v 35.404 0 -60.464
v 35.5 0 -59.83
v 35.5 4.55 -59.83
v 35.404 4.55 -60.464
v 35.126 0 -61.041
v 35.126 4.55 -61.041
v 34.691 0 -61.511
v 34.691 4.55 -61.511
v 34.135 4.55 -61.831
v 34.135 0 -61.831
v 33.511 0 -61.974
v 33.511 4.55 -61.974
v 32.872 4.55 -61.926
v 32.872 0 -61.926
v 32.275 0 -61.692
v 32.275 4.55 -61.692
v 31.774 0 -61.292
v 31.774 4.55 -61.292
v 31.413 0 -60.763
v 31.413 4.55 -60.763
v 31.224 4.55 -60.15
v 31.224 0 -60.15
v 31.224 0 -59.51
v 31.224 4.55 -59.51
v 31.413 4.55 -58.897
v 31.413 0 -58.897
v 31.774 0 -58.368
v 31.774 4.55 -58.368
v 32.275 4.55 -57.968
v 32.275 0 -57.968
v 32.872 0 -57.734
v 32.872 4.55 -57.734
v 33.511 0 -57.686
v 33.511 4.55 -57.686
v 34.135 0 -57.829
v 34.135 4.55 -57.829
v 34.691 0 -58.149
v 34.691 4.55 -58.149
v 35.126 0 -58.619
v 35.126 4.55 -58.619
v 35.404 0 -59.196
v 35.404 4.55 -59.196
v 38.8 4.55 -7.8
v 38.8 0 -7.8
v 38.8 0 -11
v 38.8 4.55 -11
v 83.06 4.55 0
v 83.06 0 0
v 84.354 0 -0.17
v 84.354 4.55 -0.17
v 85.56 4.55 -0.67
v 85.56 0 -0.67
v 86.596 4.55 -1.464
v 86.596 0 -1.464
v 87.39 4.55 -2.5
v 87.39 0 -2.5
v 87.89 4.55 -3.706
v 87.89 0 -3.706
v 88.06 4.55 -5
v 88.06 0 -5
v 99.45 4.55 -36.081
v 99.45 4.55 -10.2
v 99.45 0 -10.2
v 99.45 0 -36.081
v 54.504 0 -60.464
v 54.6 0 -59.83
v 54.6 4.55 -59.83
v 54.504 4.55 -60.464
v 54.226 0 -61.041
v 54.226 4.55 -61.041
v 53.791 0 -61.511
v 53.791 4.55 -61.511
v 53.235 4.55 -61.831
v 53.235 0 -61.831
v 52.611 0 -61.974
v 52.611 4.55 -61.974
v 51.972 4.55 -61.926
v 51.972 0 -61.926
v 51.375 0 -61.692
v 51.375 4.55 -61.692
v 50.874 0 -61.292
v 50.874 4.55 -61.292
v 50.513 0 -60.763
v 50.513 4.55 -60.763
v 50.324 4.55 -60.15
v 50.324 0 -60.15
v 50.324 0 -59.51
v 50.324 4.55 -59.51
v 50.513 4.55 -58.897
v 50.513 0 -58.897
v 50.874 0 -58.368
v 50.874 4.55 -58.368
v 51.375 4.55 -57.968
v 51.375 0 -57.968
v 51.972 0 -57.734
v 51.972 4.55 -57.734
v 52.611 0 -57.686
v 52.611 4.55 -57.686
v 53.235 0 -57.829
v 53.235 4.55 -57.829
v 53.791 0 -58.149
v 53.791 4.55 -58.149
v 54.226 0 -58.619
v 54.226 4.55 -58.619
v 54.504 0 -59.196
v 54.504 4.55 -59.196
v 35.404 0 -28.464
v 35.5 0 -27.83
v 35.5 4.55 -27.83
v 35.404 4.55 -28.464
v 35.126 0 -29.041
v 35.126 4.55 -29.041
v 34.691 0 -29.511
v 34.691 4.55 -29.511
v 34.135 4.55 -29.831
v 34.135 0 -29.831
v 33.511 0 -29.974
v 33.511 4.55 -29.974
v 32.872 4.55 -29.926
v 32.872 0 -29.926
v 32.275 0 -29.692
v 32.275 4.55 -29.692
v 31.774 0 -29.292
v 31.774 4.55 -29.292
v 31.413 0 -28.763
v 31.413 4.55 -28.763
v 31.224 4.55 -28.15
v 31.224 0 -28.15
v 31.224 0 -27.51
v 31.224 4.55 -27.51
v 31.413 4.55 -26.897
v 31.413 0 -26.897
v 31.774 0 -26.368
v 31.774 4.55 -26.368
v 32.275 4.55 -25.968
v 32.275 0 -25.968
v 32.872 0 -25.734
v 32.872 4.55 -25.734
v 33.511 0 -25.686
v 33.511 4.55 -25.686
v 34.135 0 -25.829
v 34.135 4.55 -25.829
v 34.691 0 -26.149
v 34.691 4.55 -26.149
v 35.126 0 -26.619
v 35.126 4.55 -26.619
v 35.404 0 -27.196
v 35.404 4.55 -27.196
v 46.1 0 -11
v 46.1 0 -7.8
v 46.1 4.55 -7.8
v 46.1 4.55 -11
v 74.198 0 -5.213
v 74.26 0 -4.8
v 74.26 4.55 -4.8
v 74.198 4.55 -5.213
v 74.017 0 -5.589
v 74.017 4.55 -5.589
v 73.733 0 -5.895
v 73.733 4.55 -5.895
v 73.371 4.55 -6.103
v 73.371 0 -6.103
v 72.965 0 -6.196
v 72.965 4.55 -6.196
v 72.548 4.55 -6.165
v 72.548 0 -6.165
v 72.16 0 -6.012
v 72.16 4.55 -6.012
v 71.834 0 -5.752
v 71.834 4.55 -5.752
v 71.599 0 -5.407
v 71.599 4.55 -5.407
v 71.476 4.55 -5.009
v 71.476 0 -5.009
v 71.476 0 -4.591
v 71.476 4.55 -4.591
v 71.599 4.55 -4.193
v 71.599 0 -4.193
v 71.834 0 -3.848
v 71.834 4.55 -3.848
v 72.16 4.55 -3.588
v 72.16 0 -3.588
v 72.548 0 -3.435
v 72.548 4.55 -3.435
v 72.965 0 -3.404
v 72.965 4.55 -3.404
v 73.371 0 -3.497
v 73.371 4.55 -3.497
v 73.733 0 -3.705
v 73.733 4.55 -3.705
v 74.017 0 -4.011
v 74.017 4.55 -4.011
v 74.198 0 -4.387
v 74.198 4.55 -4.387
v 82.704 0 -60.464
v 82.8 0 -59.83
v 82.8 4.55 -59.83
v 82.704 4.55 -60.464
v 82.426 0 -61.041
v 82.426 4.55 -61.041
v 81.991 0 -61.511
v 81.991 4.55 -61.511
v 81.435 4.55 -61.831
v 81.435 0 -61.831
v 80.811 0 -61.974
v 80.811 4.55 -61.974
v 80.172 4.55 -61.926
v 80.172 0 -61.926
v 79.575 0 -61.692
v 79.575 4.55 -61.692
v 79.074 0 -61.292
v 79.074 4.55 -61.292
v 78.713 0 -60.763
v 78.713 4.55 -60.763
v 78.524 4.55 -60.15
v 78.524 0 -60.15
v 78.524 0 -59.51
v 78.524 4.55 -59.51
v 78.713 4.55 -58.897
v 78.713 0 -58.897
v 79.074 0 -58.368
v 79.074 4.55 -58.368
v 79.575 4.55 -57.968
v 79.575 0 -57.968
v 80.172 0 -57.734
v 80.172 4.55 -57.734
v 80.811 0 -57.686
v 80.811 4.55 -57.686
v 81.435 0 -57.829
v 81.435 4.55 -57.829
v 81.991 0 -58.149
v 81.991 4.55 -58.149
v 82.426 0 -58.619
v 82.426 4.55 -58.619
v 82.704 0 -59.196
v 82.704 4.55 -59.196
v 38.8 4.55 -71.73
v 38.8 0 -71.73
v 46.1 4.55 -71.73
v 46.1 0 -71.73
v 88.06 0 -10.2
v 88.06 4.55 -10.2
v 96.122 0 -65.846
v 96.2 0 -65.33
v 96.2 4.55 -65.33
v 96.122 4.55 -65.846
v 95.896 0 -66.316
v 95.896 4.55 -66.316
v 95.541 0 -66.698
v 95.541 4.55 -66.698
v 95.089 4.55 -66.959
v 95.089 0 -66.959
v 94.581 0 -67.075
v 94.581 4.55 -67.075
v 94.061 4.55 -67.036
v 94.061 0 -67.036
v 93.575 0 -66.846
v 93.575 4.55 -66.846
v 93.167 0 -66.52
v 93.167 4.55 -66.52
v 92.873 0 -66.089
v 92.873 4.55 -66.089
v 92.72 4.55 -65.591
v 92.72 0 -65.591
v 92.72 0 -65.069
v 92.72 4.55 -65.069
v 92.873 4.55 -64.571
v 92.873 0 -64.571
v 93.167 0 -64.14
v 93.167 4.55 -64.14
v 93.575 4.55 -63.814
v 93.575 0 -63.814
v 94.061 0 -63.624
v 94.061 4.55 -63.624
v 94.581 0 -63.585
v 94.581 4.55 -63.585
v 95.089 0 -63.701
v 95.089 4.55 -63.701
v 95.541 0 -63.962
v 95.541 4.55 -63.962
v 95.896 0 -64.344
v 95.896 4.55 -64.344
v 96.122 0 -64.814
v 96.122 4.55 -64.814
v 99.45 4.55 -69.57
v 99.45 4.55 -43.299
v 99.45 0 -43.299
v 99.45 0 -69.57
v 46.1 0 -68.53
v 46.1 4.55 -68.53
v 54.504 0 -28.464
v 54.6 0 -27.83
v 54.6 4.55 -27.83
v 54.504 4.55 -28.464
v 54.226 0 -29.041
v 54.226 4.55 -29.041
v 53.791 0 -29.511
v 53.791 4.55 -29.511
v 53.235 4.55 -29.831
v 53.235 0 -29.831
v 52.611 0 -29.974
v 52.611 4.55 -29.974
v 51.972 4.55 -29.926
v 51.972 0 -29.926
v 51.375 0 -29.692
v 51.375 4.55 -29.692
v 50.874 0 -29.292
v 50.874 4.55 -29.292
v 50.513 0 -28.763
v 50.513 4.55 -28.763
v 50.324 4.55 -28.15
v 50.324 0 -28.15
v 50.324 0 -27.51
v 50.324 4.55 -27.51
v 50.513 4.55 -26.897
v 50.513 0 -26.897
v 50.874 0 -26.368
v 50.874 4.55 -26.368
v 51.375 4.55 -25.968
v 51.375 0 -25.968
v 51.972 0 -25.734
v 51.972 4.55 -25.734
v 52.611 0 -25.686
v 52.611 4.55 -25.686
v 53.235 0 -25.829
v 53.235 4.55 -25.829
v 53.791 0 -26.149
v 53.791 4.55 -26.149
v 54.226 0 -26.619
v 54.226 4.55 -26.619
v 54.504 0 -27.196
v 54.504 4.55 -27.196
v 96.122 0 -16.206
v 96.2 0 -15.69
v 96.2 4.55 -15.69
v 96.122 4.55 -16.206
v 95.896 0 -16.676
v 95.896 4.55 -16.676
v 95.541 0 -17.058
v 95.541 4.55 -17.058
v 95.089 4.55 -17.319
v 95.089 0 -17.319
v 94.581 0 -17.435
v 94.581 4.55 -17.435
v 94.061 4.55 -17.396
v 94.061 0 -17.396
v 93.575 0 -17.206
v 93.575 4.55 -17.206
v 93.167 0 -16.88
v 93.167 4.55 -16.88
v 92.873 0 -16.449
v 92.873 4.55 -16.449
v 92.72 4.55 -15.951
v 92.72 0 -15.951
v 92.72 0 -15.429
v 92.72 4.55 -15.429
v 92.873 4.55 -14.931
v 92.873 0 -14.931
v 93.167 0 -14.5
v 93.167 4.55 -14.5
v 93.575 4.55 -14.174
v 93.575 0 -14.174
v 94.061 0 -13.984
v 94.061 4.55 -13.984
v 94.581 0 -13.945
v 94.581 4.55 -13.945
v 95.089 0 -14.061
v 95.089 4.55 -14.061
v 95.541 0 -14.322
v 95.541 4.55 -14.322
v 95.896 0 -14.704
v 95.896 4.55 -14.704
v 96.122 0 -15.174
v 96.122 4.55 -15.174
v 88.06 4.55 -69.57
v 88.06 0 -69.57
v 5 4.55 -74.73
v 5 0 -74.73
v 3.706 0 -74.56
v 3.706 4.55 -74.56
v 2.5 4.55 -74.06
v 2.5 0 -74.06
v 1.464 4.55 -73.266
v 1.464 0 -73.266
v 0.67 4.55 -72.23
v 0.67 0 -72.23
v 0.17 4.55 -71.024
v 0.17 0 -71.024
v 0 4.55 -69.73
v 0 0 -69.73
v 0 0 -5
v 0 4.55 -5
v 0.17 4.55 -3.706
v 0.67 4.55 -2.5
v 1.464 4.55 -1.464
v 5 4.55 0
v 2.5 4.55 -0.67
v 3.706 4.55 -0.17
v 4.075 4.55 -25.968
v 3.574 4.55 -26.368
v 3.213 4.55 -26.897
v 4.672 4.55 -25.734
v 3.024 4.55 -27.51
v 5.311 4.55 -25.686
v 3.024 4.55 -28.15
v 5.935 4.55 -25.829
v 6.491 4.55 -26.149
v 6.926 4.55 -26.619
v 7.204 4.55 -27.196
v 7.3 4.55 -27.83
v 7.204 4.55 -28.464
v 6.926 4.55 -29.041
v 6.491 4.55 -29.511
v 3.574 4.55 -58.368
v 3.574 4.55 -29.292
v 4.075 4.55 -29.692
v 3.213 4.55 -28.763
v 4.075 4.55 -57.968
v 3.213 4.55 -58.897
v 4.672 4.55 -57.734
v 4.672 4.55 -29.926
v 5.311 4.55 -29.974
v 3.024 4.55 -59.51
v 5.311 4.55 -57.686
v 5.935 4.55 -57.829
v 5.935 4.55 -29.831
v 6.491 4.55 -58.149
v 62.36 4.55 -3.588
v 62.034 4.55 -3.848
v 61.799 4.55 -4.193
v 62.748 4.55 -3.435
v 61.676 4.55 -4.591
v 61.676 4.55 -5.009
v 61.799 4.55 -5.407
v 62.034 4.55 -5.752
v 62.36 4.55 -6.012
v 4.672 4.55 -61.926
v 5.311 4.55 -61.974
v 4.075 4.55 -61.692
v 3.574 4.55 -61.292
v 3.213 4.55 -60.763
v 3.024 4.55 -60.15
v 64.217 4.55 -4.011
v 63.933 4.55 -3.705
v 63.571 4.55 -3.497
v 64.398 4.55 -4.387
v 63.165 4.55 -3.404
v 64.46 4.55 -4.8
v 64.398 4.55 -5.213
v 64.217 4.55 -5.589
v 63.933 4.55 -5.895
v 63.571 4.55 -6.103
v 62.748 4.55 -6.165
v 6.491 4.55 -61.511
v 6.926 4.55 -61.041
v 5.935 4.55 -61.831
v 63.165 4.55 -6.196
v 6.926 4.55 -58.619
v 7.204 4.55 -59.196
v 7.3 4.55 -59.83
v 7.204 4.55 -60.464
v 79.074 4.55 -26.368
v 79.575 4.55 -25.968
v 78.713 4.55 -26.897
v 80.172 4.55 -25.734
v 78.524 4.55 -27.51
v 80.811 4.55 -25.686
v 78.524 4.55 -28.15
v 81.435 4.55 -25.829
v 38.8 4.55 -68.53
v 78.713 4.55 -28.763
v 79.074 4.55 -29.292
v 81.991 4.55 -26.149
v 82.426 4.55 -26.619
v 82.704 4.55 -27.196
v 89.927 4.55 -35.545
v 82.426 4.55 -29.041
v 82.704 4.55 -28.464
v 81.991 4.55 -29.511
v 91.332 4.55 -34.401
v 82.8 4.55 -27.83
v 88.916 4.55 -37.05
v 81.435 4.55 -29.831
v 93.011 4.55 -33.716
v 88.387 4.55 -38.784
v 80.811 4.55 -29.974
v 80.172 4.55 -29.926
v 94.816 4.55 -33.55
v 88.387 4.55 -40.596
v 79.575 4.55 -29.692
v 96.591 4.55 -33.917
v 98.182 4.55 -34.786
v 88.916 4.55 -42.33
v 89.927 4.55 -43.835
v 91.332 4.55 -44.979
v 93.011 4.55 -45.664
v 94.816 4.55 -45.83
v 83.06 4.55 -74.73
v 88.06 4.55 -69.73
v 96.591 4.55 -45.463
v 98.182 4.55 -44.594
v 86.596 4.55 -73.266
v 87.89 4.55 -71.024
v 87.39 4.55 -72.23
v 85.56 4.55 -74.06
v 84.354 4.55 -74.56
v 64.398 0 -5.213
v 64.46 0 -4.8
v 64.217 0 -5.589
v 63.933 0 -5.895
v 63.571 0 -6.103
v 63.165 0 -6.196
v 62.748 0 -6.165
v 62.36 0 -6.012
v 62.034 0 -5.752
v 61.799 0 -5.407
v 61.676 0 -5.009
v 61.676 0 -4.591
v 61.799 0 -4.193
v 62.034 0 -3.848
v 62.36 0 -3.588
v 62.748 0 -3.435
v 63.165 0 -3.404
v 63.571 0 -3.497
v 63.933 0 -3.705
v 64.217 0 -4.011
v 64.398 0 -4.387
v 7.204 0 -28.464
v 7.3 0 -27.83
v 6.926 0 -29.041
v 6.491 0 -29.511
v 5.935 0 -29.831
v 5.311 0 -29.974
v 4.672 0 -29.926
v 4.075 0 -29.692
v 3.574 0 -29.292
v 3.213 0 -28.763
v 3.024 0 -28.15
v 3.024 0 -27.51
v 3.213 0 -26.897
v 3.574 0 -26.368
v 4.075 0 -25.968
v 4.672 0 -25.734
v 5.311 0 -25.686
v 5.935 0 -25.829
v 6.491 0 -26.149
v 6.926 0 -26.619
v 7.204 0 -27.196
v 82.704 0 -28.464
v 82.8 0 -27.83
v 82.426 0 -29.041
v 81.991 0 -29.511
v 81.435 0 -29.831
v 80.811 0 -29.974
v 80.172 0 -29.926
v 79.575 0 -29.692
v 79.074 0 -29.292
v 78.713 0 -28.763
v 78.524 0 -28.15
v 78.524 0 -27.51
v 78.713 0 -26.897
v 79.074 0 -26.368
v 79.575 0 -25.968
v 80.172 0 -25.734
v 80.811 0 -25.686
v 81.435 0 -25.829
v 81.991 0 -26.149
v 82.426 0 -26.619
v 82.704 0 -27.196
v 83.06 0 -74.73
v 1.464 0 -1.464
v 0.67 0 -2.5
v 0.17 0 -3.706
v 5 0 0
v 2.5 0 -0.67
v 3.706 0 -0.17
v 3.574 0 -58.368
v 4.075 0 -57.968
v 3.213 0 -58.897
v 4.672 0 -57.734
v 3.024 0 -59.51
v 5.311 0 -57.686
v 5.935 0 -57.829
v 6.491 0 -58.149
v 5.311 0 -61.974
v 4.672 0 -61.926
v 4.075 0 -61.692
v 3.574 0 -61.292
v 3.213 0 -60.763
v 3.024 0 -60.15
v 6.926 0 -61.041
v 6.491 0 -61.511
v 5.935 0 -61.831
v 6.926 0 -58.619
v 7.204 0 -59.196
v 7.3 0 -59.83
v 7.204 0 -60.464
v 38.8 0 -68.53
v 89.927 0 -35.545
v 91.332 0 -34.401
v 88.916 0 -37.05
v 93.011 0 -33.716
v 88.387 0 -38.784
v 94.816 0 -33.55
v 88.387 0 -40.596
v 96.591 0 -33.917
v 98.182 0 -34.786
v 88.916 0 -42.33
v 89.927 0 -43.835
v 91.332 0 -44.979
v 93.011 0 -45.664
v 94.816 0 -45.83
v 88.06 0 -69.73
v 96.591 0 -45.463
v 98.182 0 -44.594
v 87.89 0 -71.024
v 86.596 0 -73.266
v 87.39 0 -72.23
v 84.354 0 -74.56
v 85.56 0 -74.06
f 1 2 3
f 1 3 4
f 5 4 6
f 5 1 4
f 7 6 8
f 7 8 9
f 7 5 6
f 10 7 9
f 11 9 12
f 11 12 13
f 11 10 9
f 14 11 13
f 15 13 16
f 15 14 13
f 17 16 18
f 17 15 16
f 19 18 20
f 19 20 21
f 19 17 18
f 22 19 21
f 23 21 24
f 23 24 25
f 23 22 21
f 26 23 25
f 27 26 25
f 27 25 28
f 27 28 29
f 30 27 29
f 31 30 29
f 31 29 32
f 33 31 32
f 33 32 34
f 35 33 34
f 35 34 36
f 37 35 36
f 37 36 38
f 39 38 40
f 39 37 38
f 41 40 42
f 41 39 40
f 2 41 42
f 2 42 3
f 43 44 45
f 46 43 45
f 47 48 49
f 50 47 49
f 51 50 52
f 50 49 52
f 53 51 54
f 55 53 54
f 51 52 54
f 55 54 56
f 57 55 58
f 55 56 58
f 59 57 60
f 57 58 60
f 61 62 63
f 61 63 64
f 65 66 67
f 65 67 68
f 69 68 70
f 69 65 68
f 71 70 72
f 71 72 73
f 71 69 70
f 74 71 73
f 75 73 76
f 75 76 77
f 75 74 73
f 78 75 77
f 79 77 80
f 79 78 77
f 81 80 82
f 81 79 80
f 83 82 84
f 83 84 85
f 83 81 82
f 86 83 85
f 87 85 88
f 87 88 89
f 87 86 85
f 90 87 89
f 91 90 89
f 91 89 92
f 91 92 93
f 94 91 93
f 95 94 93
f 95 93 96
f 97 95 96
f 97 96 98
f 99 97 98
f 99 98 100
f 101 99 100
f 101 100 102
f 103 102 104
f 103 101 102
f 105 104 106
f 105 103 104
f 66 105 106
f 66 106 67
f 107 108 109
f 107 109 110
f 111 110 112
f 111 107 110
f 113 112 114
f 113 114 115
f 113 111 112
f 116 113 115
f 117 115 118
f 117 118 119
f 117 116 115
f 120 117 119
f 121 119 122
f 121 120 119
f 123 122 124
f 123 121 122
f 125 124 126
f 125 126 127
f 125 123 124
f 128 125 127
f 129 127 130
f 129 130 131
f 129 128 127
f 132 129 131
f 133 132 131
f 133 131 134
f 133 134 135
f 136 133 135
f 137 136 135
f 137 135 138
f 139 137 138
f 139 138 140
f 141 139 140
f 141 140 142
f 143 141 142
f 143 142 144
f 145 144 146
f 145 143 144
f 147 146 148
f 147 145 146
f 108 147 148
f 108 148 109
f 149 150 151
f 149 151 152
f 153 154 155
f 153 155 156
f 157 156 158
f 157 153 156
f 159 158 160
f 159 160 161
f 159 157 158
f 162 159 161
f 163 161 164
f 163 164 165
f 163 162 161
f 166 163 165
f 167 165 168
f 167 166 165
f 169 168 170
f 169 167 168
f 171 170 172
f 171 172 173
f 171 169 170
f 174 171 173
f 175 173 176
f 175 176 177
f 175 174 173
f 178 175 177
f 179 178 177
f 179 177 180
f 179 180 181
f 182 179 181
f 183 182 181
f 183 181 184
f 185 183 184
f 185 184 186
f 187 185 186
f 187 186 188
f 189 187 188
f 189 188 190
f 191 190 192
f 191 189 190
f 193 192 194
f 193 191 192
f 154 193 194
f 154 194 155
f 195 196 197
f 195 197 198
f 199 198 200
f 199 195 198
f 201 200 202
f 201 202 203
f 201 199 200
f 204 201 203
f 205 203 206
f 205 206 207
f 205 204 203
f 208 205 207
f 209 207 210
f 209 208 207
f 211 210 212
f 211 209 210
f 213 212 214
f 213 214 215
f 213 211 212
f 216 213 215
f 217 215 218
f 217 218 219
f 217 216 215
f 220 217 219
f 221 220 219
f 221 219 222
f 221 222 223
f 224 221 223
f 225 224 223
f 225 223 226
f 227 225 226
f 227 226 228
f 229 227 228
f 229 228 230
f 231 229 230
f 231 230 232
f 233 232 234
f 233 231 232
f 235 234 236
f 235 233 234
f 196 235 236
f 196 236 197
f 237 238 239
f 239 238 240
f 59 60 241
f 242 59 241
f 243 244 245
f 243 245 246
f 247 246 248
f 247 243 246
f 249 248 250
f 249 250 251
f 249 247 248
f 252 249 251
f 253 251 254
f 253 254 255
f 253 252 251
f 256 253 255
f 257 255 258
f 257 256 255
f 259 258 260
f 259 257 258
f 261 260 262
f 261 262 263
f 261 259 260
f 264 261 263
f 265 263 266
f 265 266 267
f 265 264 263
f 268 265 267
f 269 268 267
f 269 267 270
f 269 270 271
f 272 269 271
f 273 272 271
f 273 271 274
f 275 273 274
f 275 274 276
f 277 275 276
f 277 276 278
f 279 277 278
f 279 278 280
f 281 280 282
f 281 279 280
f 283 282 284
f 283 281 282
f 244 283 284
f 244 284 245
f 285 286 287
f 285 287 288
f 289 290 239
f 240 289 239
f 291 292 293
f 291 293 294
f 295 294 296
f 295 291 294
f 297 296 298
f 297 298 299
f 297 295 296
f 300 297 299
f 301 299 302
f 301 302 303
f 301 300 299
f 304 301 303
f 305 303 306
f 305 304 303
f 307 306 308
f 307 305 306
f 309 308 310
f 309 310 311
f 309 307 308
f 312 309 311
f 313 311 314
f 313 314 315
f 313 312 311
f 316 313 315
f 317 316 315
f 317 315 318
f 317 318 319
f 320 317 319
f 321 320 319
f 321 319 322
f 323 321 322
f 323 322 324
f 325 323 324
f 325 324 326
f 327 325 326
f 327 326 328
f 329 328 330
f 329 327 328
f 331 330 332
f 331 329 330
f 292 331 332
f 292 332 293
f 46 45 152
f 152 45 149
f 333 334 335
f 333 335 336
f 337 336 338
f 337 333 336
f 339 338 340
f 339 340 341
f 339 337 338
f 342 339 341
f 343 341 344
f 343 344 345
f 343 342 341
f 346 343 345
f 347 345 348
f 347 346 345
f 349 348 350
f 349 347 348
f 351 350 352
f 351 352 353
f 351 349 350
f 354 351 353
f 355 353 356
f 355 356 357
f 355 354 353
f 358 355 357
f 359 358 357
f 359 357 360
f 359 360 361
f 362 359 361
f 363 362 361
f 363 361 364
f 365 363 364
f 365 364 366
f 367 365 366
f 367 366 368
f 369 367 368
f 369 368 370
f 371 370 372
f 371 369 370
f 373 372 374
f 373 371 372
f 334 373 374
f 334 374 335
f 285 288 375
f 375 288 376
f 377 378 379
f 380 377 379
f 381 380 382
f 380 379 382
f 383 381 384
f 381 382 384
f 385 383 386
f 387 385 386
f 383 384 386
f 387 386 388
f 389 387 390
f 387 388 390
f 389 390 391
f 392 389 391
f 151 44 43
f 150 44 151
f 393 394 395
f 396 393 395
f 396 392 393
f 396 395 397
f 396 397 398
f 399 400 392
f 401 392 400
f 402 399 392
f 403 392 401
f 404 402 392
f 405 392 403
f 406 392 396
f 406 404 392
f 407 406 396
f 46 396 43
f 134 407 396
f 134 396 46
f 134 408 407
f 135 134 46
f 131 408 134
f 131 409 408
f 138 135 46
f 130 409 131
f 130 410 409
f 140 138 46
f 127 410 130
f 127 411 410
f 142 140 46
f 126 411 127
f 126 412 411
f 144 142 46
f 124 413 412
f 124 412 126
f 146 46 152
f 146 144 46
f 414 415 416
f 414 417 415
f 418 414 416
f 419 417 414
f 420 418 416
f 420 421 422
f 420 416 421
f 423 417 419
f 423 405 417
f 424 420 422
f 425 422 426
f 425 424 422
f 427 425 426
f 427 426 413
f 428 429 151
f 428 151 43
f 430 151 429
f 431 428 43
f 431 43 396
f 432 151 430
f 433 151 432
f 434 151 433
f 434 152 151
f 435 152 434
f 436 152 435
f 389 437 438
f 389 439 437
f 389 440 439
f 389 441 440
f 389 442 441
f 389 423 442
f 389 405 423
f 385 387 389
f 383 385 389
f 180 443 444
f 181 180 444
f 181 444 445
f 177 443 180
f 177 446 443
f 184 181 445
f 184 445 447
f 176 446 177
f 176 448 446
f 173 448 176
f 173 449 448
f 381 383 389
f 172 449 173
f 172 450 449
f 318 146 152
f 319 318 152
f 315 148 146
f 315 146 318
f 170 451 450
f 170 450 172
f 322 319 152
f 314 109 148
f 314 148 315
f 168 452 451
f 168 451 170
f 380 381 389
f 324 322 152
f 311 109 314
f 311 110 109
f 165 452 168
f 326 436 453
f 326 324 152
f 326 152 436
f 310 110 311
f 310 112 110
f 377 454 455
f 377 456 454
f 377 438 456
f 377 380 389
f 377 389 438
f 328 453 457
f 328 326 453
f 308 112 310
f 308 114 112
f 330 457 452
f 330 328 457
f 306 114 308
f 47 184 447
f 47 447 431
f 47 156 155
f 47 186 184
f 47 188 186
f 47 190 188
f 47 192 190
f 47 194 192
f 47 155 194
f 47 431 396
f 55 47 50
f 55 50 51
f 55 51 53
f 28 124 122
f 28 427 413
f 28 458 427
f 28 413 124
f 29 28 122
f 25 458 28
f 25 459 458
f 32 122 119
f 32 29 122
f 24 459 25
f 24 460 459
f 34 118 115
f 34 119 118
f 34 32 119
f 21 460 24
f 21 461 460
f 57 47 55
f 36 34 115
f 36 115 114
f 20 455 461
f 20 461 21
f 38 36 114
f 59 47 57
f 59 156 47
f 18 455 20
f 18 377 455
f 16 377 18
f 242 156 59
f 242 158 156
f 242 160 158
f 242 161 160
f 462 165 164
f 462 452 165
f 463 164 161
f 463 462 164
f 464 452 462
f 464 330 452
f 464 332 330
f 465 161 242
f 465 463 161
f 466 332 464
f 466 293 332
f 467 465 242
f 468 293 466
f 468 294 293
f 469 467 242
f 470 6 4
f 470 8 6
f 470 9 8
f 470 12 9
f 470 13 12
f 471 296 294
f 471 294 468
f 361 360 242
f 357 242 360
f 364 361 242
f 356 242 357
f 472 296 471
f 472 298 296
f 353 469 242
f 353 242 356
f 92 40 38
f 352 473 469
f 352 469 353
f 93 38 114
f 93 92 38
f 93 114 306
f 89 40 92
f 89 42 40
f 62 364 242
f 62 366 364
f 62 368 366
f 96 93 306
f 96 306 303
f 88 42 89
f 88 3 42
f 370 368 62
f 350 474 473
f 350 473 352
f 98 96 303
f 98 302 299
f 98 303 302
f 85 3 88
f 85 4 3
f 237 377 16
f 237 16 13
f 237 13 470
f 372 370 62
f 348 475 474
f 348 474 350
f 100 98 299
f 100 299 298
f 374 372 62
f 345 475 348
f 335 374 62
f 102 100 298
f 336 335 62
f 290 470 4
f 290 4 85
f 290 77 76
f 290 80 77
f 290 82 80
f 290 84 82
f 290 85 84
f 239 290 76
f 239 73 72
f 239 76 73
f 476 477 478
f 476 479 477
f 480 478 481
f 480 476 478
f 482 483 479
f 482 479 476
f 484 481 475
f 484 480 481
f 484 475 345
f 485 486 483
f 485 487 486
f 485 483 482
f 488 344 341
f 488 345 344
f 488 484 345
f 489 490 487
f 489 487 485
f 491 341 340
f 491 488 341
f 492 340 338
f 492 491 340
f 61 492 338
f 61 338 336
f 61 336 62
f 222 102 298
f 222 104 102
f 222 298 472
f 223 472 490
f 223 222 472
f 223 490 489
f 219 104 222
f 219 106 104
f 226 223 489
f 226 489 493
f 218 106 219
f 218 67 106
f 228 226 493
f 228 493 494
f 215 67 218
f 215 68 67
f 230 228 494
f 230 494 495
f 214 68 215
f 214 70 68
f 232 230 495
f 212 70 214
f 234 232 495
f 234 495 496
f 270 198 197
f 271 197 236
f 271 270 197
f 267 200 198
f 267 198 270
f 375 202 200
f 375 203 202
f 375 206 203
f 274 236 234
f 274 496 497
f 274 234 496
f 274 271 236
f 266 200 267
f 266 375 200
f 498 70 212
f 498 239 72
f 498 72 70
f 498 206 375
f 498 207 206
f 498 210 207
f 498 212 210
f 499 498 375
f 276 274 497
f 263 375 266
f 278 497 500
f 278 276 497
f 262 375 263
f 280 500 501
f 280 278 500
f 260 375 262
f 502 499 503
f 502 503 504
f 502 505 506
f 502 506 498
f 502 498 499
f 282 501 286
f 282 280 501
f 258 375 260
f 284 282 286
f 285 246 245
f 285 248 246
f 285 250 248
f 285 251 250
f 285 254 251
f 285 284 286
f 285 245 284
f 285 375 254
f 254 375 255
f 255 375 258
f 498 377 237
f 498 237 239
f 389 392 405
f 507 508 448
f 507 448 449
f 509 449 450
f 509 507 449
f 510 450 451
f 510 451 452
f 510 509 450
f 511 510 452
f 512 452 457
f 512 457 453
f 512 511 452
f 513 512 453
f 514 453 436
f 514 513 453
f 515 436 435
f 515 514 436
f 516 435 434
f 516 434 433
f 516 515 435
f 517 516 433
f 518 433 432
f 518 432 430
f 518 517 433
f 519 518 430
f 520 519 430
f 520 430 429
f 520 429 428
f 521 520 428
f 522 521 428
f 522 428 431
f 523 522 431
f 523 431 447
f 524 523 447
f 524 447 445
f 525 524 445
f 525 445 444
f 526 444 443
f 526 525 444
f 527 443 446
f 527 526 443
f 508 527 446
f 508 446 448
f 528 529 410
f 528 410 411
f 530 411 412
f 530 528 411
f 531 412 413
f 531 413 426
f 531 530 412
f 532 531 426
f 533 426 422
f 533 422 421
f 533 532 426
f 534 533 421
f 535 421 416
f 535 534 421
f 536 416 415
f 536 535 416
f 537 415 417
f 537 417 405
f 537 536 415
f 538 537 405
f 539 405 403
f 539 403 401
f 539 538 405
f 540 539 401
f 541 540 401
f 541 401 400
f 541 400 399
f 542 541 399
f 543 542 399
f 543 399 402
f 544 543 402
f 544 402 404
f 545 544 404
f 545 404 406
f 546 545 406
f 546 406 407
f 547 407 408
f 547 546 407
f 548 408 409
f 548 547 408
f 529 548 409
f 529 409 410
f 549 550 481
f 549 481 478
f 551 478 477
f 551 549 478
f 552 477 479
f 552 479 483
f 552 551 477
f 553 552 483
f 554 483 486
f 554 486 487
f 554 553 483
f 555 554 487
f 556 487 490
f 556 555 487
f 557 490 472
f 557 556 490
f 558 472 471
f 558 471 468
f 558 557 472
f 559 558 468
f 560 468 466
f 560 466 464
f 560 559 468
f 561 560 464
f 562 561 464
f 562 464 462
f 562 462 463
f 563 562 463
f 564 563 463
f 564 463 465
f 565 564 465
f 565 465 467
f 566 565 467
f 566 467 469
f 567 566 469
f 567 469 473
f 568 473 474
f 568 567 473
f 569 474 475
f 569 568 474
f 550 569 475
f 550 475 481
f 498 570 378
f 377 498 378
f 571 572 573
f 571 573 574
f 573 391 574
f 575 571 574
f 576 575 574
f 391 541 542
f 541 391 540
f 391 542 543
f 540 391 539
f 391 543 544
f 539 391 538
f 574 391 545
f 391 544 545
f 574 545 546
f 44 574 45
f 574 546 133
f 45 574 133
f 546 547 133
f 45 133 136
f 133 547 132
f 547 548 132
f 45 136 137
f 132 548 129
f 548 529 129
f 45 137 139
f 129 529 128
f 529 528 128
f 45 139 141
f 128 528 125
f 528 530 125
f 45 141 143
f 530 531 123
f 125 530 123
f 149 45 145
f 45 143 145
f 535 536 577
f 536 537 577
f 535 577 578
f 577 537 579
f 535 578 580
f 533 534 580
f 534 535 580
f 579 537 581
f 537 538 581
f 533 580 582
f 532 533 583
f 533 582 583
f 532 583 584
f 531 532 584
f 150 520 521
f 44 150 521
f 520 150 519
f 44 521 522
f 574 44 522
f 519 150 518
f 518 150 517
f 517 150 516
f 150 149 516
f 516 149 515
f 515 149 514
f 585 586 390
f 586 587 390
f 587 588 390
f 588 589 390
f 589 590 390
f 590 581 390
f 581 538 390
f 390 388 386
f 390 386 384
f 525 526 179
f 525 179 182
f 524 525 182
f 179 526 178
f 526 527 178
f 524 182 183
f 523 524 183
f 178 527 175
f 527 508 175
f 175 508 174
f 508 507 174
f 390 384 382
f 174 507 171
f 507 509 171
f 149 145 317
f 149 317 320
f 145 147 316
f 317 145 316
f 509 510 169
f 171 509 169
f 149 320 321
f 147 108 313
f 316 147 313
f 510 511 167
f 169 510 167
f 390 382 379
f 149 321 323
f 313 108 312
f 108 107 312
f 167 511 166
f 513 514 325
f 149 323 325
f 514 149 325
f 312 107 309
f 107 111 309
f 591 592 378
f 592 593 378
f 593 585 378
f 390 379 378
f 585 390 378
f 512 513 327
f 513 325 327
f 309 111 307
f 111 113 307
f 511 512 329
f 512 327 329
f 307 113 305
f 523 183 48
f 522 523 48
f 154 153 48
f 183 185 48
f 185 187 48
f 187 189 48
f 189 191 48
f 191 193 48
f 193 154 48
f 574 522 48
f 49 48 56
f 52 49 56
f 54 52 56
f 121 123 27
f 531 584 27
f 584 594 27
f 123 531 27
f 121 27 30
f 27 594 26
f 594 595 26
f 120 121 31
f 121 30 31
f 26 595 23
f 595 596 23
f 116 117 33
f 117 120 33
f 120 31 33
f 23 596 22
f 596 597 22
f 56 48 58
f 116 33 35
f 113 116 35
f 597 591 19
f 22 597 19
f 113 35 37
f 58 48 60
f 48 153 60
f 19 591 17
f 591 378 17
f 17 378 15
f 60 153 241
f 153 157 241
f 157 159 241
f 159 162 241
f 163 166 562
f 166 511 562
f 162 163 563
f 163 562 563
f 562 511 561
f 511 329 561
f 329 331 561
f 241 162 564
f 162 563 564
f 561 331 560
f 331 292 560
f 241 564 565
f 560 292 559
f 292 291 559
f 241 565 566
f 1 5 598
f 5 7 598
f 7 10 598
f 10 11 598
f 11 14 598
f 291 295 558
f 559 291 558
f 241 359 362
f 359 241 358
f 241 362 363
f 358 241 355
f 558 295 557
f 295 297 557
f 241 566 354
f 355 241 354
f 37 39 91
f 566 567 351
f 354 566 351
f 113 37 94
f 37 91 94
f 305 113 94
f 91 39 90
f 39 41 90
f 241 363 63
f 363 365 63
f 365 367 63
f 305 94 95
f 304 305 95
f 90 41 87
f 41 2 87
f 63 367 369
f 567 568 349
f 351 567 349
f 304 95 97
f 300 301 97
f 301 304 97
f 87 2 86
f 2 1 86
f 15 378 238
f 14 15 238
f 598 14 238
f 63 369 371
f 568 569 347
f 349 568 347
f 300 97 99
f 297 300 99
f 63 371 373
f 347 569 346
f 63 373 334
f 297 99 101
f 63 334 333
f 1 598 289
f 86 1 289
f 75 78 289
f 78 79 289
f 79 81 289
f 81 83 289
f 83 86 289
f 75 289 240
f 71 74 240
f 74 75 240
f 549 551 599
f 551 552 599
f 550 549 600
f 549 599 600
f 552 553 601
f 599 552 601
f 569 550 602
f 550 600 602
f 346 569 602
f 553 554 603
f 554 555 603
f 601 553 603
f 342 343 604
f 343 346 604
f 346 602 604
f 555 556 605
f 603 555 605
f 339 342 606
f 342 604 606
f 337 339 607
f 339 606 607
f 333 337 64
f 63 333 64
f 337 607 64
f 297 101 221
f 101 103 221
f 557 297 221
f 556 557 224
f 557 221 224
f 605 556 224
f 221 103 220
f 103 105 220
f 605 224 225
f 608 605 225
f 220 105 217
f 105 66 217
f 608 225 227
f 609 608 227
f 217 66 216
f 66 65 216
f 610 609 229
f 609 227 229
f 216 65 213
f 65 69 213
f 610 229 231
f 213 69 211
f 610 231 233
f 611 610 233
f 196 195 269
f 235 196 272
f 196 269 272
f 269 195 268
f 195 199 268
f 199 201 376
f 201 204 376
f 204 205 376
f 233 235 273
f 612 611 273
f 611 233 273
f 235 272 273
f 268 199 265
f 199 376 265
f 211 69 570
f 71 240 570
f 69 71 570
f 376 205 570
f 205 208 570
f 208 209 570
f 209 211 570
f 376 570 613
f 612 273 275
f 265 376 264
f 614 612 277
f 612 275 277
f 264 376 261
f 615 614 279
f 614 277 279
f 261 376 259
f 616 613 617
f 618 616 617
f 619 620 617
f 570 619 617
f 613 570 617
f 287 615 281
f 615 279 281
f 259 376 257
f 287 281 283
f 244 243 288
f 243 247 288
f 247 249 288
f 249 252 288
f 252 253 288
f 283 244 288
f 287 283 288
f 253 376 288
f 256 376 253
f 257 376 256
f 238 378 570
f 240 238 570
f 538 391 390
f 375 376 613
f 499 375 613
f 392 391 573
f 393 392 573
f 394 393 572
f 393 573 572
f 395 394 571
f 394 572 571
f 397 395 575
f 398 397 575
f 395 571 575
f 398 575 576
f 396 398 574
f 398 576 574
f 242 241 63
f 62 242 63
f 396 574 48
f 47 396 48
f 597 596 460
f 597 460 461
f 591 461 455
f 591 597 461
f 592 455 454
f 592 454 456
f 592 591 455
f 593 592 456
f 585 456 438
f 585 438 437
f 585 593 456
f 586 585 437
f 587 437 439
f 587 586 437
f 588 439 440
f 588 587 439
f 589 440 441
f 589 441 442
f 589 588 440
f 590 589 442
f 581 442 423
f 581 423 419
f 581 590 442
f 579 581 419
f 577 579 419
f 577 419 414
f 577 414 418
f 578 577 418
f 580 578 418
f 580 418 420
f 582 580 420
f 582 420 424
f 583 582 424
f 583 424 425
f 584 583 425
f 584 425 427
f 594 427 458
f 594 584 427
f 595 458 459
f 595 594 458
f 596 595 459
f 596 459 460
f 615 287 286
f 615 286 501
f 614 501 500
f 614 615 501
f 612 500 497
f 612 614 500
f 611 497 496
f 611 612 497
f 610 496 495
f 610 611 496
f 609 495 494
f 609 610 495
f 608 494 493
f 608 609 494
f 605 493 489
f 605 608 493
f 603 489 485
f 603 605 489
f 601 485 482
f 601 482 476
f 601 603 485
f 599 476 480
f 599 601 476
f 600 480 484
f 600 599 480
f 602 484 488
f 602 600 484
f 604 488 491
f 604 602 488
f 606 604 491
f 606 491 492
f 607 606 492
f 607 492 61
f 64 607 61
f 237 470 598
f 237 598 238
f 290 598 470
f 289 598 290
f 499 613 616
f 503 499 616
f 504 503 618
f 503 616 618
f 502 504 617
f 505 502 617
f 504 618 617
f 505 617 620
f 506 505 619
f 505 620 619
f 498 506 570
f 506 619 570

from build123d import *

# Parameters (mm, degrees)
SKETCH1_R           = 2.15
SKETCH1_R_2         = 6.15
SKETCH1_R_3         = 1.75
SKETCH1_R_4         = 1.4
SKETCH1_W           = 7.3
SKETCH1_H           = 3.2
BOSS_EXTRUDE1_DEPTH = 4.55
SKETCH2_W           = 30.597245163
SKETCH2_H           = 76.240319195
CUT_EXTRUDE1_DEPTH  = 5.55


with BuildPart() as part:
    # Sketch1 → Boss-Extrude1 (new body)
    with BuildSketch(Plane(origin=(0, 0, 0), x_dir=(1, 0, 0), z_dir=(0, 1, 0))):
        with BuildLine():
            Line((5, 0), (83.06, 0))
            ThreePointArc((83.06, 0), (86.595533906, 1.464466094), (88.06, 5))
            Line((88.06, 5), (88.06, 10.2))
            Line((88.06, 10.2), (109.36, 10.2))
            ThreePointArc((109.36, 10.2), (112.895533906, 11.664466094), (114.36, 15.2))
            Line((114.36, 15.2), (114.36, 64.57))
            ThreePointArc((114.36, 64.57), (112.895533906, 68.105533906), (109.36, 69.57))
            Line((109.36, 69.57), (88.06, 69.57))
            Line((88.06, 69.57), (88.06, 69.73))
            ThreePointArc((88.06, 69.73), (86.595533906, 73.265533906), (83.06, 74.73))
            Line((83.06, 74.73), (5, 74.73))
            ThreePointArc((5, 74.73), (1.464466094, 73.265533906), (0, 69.73))
            Line((0, 69.73), (0, 5))
            ThreePointArc((0, 5), (1.464466094, 1.464466094), (5, 0))
        make_face()
        with Locations((5.15, 59.83)):
            Circle(SKETCH1_R, mode=Mode.SUBTRACT)
        with Locations((33.35, 59.83)):
            Circle(SKETCH1_R, mode=Mode.SUBTRACT)
        with Locations((52.45, 59.83)):
            Circle(SKETCH1_R, mode=Mode.SUBTRACT)
        with Locations((80.65, 59.83)):
            Circle(SKETCH1_R, mode=Mode.SUBTRACT)
        with Locations((5.15, 27.83)):
            Circle(SKETCH1_R, mode=Mode.SUBTRACT)
        with Locations((33.35, 27.83)):
            Circle(SKETCH1_R, mode=Mode.SUBTRACT)
        with Locations((52.45, 27.83)):
            Circle(SKETCH1_R, mode=Mode.SUBTRACT)
        with Locations((80.65, 27.83)):
            Circle(SKETCH1_R, mode=Mode.SUBTRACT)
        with Locations((94.47, 39.69)):
            Circle(SKETCH1_R_2, mode=Mode.SUBTRACT)
        with Locations((94.45, 65.33)):
            Circle(SKETCH1_R_3, mode=Mode.SUBTRACT)
        with Locations((94.45, 15.69)):
            Circle(SKETCH1_R_3, mode=Mode.SUBTRACT)
        with Locations((63.06, 4.8)):
            Circle(SKETCH1_R_4, mode=Mode.SUBTRACT)
        with Locations((72.86, 4.8)):
            Circle(SKETCH1_R_4, mode=Mode.SUBTRACT)
        with Locations((42.45, 70.13)):
            Rectangle(SKETCH1_W, SKETCH1_H, mode=Mode.SUBTRACT)
        with Locations((42.45, 9.4)):
            Rectangle(SKETCH1_W, SKETCH1_H, mode=Mode.SUBTRACT)
    extrude(amount=BOSS_EXTRUDE1_DEPTH)

    # Sketch2 → Cut-Extrude1 (cut, through all)
    with BuildSketch(Plane(origin=(0, 4.55, 0), x_dir=(1, 0, 0), z_dir=(0, 1, 0))):
        with Locations((114.748622582, 38.120159597)):
            Rectangle(SKETCH2_W, SKETCH2_H)
    extrude(amount=-CUT_EXTRUDE1_DEPTH, mode=Mode.SUBTRACT)


solid = part.part
